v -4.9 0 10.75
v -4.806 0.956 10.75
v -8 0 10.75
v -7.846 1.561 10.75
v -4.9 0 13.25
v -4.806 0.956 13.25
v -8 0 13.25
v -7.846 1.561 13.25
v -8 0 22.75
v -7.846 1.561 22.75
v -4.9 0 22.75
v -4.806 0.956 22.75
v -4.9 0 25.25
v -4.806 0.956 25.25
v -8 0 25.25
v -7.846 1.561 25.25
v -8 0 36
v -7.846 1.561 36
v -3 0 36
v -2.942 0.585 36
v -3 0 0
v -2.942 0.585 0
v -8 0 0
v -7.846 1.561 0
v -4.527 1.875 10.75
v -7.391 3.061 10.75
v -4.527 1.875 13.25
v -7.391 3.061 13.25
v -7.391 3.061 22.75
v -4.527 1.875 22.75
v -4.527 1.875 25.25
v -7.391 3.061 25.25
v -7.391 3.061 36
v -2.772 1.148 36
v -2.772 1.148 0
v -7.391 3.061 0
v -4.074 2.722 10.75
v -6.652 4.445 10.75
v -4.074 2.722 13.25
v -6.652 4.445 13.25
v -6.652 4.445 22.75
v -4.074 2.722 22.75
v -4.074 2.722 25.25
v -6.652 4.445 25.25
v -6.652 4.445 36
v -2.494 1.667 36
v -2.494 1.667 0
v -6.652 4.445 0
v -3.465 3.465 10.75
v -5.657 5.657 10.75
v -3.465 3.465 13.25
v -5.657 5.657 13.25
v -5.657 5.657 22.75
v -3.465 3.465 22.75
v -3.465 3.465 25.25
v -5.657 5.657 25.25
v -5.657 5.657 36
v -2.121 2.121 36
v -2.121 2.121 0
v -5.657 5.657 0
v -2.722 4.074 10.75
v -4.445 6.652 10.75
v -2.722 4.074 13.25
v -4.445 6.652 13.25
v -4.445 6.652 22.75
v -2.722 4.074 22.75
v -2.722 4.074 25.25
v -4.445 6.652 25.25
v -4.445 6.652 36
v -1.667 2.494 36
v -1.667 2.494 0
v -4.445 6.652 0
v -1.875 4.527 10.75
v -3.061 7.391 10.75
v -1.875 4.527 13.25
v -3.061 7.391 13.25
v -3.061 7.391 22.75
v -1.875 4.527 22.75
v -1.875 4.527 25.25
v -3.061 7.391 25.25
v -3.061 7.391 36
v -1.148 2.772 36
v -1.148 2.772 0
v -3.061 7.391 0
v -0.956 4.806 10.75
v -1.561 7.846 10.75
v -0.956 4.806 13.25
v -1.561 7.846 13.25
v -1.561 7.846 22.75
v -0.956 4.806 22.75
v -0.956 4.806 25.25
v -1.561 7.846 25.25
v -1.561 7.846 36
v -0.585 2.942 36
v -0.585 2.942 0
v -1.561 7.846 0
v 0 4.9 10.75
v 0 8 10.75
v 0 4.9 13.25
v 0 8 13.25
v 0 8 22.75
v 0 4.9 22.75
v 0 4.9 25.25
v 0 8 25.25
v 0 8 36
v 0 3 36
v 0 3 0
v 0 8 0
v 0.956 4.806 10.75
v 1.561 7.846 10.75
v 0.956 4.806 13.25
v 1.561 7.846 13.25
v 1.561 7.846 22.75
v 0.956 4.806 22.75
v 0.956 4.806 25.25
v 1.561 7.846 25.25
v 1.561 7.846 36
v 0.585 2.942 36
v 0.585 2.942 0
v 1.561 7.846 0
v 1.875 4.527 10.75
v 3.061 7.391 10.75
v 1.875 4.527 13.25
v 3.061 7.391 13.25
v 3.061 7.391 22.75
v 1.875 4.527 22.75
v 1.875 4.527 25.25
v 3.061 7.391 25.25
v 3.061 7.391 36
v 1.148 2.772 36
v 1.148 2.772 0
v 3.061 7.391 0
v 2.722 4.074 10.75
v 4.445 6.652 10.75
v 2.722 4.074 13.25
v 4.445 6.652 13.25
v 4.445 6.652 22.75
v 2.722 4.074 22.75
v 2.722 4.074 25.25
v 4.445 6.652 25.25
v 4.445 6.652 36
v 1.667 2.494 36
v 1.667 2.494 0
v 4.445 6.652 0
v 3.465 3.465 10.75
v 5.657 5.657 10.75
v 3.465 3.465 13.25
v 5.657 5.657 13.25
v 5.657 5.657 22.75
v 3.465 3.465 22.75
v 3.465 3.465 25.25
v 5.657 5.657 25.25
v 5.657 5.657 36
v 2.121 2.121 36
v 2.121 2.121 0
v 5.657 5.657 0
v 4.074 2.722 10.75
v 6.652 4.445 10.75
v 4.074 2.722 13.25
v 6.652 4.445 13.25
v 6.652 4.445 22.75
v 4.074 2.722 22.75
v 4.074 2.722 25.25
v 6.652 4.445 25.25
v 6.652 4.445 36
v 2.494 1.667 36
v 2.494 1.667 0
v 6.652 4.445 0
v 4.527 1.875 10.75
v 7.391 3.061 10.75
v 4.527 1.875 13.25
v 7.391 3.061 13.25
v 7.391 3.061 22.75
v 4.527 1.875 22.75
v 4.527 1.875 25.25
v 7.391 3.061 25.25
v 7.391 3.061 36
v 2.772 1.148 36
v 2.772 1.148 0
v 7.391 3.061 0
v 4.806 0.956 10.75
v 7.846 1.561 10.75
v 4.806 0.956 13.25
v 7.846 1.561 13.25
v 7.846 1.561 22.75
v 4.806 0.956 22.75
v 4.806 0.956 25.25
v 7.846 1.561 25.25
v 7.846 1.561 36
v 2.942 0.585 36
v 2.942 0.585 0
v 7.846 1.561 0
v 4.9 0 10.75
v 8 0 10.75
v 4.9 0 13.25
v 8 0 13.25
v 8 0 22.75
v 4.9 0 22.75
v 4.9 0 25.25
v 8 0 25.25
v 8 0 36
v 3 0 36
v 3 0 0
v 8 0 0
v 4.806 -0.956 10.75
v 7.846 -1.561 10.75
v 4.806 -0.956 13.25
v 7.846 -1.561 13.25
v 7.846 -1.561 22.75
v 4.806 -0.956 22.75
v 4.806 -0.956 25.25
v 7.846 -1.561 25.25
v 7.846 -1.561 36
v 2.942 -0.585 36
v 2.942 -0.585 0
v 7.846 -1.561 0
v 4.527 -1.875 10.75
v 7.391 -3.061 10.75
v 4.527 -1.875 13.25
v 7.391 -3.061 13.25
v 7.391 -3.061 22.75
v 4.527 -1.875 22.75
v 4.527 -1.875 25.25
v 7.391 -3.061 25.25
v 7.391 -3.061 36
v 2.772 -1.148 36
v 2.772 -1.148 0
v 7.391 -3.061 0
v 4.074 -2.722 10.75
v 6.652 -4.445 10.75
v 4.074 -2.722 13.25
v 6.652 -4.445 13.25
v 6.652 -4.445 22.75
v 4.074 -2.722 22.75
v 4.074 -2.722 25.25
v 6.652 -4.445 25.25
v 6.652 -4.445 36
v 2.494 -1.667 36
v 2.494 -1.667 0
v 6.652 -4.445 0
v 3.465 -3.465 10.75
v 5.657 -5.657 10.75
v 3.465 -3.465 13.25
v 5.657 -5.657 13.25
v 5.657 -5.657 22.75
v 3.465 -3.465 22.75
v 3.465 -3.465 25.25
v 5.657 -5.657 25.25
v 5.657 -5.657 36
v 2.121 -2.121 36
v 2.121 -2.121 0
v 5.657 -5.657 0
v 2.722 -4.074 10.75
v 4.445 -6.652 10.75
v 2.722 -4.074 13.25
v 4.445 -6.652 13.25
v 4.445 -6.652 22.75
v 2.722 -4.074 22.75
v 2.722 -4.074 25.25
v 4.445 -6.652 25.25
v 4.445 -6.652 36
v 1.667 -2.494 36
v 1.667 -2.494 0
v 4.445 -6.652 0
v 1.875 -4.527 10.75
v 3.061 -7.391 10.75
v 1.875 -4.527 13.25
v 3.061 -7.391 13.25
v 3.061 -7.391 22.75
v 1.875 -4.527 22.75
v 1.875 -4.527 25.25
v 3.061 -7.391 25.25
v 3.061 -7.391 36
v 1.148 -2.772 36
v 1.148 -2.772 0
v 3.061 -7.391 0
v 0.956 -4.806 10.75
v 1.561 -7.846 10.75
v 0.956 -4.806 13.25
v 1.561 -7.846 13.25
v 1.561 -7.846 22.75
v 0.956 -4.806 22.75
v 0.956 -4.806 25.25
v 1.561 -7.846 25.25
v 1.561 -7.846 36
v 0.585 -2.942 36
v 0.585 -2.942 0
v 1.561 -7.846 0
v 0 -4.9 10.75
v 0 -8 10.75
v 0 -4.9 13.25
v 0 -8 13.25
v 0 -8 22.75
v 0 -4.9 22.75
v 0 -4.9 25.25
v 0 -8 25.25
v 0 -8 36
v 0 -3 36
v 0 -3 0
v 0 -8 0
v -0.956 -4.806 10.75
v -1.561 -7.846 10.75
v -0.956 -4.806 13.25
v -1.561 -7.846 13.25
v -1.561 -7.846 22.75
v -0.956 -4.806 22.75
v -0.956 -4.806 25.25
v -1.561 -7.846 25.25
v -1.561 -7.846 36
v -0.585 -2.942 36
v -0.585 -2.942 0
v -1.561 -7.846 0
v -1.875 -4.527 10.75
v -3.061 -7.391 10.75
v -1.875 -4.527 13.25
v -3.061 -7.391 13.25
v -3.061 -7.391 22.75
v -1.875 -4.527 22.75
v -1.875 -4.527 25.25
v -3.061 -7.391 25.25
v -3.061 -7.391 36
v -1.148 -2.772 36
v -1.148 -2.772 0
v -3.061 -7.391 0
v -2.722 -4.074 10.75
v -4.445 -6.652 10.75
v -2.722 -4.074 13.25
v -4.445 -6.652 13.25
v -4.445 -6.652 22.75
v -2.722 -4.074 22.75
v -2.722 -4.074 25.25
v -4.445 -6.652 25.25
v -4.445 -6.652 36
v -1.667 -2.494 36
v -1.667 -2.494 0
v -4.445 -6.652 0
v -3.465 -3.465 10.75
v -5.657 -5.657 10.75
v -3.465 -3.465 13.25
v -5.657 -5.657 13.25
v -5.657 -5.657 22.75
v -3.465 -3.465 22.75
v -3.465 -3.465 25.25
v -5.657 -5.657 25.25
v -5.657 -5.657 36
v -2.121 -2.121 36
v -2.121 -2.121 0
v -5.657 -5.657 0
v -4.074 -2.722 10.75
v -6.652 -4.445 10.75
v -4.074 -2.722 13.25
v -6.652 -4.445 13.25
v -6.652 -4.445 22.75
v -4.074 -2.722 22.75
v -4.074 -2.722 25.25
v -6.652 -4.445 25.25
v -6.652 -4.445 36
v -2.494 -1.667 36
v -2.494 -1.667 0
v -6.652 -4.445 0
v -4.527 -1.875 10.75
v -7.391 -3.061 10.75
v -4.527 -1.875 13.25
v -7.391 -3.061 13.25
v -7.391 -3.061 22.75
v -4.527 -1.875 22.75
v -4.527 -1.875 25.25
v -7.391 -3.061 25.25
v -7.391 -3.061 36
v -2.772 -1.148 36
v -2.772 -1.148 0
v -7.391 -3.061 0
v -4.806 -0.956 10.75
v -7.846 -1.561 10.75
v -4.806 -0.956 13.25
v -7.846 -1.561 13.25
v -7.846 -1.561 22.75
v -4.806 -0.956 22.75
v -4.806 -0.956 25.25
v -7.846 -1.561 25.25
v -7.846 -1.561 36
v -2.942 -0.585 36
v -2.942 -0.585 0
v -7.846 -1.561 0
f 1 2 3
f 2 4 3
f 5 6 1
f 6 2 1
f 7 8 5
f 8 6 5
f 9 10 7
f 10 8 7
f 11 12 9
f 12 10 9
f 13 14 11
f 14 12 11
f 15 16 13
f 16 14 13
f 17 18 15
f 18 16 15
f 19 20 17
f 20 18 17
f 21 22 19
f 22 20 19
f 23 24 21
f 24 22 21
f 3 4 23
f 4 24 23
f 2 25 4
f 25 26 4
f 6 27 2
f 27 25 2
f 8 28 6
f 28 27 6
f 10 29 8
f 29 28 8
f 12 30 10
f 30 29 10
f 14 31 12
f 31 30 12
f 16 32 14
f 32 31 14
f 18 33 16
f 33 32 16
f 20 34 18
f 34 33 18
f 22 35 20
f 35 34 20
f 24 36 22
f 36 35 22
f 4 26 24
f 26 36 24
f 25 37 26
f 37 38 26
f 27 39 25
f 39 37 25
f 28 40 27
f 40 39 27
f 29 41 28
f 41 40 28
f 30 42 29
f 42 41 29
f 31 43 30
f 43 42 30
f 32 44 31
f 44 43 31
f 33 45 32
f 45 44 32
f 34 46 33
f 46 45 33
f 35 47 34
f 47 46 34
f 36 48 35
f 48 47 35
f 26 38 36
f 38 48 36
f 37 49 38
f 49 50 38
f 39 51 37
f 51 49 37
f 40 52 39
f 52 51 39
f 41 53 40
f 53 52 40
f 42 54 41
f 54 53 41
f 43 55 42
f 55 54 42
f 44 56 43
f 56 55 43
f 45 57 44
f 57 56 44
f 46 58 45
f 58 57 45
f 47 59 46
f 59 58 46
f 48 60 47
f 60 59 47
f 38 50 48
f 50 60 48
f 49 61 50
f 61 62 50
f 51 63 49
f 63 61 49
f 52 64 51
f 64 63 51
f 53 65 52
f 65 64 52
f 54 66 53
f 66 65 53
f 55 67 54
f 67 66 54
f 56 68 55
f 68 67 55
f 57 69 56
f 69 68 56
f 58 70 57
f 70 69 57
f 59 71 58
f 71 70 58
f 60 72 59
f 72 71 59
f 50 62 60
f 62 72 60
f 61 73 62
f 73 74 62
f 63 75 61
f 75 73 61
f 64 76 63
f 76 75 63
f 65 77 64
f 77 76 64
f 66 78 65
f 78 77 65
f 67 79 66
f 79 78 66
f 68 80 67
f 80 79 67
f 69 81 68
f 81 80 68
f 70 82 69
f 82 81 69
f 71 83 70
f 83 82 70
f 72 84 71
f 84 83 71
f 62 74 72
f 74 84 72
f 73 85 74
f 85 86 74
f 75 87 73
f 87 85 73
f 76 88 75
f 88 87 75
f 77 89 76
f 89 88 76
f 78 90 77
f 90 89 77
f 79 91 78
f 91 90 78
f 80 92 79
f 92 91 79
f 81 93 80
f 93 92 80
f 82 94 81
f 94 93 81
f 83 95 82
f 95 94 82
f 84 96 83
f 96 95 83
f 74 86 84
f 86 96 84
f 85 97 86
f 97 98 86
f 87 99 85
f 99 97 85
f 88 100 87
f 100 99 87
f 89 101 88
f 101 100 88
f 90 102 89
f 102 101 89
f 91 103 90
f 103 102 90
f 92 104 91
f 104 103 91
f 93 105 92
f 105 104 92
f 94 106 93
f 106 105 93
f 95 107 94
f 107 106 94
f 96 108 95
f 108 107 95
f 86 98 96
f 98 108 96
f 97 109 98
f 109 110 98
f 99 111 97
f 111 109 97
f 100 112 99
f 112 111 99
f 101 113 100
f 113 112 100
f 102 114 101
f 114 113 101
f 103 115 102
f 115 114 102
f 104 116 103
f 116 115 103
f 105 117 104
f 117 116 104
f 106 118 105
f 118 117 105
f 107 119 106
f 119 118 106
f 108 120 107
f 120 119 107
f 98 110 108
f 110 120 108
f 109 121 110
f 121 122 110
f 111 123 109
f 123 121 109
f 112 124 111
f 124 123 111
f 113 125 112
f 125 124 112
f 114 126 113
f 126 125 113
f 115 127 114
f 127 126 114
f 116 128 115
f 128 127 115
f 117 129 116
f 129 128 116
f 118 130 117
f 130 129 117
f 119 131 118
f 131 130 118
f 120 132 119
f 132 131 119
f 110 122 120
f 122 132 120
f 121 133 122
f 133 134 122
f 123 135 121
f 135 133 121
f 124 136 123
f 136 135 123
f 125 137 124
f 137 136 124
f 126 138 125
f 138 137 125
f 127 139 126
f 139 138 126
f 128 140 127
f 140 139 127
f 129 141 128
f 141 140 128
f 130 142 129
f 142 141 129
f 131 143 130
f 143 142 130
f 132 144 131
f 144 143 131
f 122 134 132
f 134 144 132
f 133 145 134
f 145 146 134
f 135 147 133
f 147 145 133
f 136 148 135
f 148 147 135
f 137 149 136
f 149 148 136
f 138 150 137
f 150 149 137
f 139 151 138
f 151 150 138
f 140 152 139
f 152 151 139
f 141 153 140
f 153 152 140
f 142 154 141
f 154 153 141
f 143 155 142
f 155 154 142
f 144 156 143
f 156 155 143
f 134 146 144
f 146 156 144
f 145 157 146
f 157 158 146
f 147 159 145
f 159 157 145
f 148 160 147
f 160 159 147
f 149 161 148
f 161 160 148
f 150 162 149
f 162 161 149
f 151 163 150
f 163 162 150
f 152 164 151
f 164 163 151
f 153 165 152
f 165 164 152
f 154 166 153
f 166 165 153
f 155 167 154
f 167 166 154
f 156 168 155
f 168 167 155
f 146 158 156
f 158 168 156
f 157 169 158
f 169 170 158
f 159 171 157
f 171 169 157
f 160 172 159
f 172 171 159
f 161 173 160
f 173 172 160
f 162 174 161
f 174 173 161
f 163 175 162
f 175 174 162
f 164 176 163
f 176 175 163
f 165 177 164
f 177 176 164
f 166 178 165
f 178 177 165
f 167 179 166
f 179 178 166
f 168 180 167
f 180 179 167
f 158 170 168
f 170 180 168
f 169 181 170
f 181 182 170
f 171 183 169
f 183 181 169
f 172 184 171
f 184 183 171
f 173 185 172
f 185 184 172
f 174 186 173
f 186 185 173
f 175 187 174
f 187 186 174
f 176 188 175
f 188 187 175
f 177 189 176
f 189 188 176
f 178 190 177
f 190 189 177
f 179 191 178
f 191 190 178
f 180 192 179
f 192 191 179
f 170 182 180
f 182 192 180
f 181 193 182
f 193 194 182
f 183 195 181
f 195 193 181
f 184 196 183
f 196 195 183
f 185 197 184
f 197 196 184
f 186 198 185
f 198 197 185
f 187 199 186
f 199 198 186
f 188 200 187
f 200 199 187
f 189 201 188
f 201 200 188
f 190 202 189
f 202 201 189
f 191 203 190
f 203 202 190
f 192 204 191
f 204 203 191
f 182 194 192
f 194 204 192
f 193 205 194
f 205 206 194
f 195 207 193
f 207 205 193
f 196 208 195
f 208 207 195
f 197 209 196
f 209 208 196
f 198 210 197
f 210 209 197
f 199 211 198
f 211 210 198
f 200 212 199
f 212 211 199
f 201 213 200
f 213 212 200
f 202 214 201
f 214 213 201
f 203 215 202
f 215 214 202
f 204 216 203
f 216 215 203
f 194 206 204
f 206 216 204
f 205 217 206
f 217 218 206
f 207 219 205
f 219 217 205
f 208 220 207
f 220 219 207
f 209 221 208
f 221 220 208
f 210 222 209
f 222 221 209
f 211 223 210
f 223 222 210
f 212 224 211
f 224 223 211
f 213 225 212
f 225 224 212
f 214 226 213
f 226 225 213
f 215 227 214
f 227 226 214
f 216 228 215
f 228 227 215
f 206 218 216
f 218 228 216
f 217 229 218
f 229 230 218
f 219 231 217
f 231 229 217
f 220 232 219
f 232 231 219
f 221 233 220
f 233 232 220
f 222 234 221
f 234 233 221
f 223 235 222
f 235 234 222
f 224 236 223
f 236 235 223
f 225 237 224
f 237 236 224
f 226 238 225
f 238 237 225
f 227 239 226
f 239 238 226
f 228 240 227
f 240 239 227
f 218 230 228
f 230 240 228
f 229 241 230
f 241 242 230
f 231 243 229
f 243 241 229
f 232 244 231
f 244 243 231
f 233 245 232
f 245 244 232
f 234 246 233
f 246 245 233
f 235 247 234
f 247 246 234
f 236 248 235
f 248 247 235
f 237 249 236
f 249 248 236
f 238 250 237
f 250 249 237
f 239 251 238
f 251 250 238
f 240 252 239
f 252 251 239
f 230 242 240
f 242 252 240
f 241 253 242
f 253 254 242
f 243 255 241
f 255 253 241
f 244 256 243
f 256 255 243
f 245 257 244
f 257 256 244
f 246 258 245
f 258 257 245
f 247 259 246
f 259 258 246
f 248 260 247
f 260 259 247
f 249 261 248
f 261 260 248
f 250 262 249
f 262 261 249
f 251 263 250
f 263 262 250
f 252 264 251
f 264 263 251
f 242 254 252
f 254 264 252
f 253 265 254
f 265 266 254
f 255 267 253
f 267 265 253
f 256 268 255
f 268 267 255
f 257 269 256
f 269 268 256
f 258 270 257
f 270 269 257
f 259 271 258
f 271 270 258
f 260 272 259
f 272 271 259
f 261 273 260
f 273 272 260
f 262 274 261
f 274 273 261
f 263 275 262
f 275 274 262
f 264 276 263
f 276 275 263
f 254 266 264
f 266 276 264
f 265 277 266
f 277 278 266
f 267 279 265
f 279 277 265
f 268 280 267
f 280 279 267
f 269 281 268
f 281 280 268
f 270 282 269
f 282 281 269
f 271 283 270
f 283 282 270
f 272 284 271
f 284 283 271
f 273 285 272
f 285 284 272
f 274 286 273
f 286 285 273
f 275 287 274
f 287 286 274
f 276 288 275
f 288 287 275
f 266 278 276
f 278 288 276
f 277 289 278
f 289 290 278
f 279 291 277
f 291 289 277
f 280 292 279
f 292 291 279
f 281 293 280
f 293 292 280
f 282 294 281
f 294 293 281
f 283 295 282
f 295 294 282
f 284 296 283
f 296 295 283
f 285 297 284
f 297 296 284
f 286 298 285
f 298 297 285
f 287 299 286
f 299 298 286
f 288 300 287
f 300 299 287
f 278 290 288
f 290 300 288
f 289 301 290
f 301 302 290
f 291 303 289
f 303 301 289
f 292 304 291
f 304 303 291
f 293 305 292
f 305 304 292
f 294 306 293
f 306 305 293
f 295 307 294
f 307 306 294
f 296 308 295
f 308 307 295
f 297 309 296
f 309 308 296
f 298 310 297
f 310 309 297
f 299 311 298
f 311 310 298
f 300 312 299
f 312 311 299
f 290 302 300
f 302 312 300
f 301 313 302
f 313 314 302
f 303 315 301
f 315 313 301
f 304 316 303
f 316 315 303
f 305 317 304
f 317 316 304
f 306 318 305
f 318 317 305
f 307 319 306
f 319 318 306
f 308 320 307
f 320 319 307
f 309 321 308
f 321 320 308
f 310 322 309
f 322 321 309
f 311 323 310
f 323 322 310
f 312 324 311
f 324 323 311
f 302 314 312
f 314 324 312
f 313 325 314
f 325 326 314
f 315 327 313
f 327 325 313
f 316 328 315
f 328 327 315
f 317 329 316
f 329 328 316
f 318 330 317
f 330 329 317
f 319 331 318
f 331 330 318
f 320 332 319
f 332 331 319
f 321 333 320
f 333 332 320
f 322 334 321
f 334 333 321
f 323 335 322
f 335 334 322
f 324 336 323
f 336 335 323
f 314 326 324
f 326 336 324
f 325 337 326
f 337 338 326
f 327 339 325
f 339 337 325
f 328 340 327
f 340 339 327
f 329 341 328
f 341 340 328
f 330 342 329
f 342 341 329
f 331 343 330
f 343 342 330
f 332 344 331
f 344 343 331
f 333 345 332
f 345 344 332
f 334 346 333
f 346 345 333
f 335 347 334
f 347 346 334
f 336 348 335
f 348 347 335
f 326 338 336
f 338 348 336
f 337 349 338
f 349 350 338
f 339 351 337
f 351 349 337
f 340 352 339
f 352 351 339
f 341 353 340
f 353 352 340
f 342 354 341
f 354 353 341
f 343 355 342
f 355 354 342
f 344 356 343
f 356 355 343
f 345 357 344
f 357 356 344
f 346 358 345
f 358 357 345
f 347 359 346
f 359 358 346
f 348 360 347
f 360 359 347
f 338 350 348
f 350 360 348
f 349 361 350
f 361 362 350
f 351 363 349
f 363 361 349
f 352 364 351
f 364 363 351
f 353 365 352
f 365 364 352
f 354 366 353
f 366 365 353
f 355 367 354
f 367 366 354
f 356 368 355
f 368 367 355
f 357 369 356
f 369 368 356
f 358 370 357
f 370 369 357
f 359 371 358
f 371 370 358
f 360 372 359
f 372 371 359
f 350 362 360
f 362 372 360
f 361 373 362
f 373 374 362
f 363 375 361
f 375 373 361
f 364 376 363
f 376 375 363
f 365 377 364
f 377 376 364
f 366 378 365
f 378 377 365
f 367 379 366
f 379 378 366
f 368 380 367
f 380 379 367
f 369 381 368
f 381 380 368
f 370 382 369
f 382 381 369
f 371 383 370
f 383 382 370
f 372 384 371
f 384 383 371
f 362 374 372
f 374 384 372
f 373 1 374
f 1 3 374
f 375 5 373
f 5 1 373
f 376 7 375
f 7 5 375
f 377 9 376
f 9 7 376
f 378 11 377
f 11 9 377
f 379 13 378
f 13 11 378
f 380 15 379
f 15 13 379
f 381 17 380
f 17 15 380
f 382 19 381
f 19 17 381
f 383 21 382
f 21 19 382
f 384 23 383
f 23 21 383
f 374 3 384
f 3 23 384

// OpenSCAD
$fn = 32;

// ----------------------------------------------------------------------
// Grooved revolve: stepped, bore R3
// ----------------------------------------------------------------------

// --- parameters (mm) ---
bore_r = 3;               // bore radius
outer_r = 8;              // outer radius of the body
total_h = 36;             // overall height, Z
wall = 5;                 // radial wall thickness
groove_w = 2.5;           // groove width
groove_d = 3.1;           // groove depth
grooves = 2;              // number of outer grooves

bbox_x = 2 * outer_r;  // full diameter
bore_d = 2 * bore_r;  // bore diameter
body_d = 2 * outer_r;  // body diameter
revolve_angle = 360;  // full turn around the Z axis

profile = [[3, 0], [8, 0], [8, 10.75], [4.9, 10.75], [4.9, 13.25], [8, 13.25], [8, 22.75], [4.9, 22.75], [4.9, 25.25], [8, 25.25], [8, 36], [3, 36]];  // primary outline, 12 points, counter clockwise

// --- the one profile operation ---
rotate_extrude(angle = revolve_angle) polygon(points = profile);
